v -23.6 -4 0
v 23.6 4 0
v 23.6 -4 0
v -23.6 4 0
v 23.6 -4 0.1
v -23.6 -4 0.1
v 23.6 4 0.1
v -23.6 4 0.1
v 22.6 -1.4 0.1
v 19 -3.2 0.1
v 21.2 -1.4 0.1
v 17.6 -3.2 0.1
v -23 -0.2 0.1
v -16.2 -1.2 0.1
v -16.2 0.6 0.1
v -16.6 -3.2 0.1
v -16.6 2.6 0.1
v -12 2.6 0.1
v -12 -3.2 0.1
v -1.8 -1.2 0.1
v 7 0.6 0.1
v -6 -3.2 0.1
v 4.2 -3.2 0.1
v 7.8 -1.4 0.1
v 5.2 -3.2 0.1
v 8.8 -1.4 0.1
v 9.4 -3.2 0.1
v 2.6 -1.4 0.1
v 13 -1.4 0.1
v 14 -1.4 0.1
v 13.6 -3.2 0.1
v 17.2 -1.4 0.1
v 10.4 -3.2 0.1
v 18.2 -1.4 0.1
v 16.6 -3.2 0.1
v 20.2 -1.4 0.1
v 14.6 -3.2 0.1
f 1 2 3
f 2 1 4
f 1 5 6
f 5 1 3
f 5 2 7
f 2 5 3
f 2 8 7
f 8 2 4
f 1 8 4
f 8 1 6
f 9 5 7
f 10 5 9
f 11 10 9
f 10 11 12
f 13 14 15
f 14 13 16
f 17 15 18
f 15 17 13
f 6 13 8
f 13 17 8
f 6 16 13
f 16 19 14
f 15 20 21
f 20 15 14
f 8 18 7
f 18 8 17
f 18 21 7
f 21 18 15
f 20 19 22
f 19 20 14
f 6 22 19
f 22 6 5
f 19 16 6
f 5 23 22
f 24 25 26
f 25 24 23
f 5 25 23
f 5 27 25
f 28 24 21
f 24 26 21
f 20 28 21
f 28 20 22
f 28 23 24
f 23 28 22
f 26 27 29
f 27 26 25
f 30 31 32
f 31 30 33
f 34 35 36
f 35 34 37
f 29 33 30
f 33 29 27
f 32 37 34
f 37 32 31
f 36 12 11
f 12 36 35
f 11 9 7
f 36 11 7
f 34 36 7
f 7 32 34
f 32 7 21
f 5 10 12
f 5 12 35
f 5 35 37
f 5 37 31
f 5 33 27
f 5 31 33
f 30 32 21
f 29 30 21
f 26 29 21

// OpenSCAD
// file: ../p/4-4edge.scad
use <../lib.scad>
$fa=1; $fs=0.2;
function ldraw_lib__4_4edge(realsolid=false) = [
// 0 Circle 1.0
// 0 Name: 4-4edge.dat
// 0 Author: James Jessiman
// 0 !LDRAW_ORG Primitive UPDATE 2017-01
// 0 !LICENSE Licensed under CC BY 2.0 and CC BY 4.0 : see CAreadme.txt
// 
// 0 BFC CERTIFY CCW
  [0,"BFC","CERTIFY"],
  [0,"BFC","CCW"],
// 
// 0 !HISTORY 1998-12-15 [PTadmin] Official Update 1998-10
// 0 !HISTORY 2005-12-28 [PTadmin] Official Update 2005-01
// 0 !HISTORY 2007-06-24 [PTadmin] Header formatted for Contributor Agreement
// 0 !HISTORY 2008-07-01 [PTadmin] Official Update 2008-01
// 0 !HISTORY 2017-01-15 [Steffen] BFCed
// 0 !HISTORY 2017-12-30 [PTadmin] Official Update 2017-01
// 
// 
// 2 24 1 0 0 0.9239 0 0.3827
  [2,24,1,0,0,0.9239,0,0.3827],
// 2 24 0.9239 0 0.3827 0.7071 0 0.7071
  [2,24,0.9239,0,0.3827,0.7071,0,0.7071],
// 2 24 0.7071 0 0.7071 0.3827 0 0.9239
  [2,24,0.7071,0,0.7071,0.3827,0,0.9239],
// 2 24 0.3827 0 0.9239 0 0 1
  [2,24,0.3827,0,0.9239,0,0,1],
// 2 24 0 0 1 -0.3827 0 0.9239
  [2,24,0,0,1,-0.3827,0,0.9239],
// 2 24 -0.3827 0 0.9239 -0.7071 0 0.7071
  [2,24,-0.3827,0,0.9239,-0.7071,0,0.7071],
// 2 24 -0.7071 0 0.7071 -0.9239 0 0.3827
  [2,24,-0.7071,0,0.7071,-0.9239,0,0.3827],
// 2 24 -0.9239 0 0.3827 -1 0 -0
  [2,24,-0.9239,0,0.3827,-1,0,-0],
// 2 24 -1 0 -0 -0.9239 0 -0.3827
  [2,24,-1,0,-0,-0.9239,0,-0.3827],
// 2 24 -0.9239 0 -0.3827 -0.7071 0 -0.7071
  [2,24,-0.9239,0,-0.3827,-0.7071,0,-0.7071],
// 2 24 -0.7071 0 -0.7071 -0.3827 0 -0.9239
  [2,24,-0.7071,0,-0.7071,-0.3827,0,-0.9239],
// 2 24 -0.3827 0 -0.9239 0 0 -1
  [2,24,-0.3827,0,-0.9239,0,0,-1],
// 2 24 0 0 -1 0.3827 0 -0.9239
  [2,24,0,0,-1,0.3827,0,-0.9239],
// 2 24 0.3827 0 -0.9239 0.7071 0 -0.7071
  [2,24,0.3827,0,-0.9239,0.7071,0,-0.7071],
// 2 24 0.7071 0 -0.7071 0.9239 0 -0.3827
  [2,24,0.7071,0,-0.7071,0.9239,0,-0.3827],
// 2 24 0.9239 0 -0.3827 1 0 0
  [2,24,0.9239,0,-0.3827,1,0,0],
];
module ldraw_lib__4_4edge(step=0, col=false, unit=2/5, alt=false, line=0.2, solid=!$preview)
    makepoly(ldraw_lib__4_4edge(solid), step=step, col=col, unit=unit, alt=alt, line=line, solid=solid);
ldraw_lib__4_4edge(line=0.2);
// file: ../p/4-4disc.scad
use <../lib.scad>
$fa=1; $fs=0.2;
function ldraw_lib__4_4disc(realsolid=false) = [
// 0 Disc 1.0
// 0 Name: 4-4disc.dat
// 0 Author: James Jessiman
// 0 !LDRAW_ORG Primitive UPDATE 2002-02
// 0 !LICENSE Licensed under CC BY 2.0 and CC BY 4.0 : see CAreadme.txt
// 
// 0 BFC CERTIFY CCW
  [0,"BFC","CERTIFY"],
  [0,"BFC","CCW"],
// 
// 0 !HISTORY 1998-12-15 [PTadmin] Official Update 1998-10
// 0 !HISTORY 2002-03-23 [sbliss] Added BFC statement
// 0 !HISTORY 2002-04-25 [PTadmin] Official Update 2002-02
// 0 !HISTORY 2007-06-24 [PTadmin] Header formatted for Contributor Agreement
// 0 !HISTORY 2008-07-01 [PTadmin] Official Update 2008-01
// 
// 
// 3 16 0 0 0 1 0 0 0.9239 0 0.3827
  [3,16,0,0,0,1,0,0,0.9239,0,0.3827],
// 3 16 0 0 0 0.9239 0 0.3827 0.7071 0 0.7071
  [3,16,0,0,0,0.9239,0,0.3827,0.7071,0,0.7071],
// 3 16 0 0 0 0.7071 0 0.7071 0.3827 0 0.9239
  [3,16,0,0,0,0.7071,0,0.7071,0.3827,0,0.9239],
// 3 16 0 0 0 0.3827 0 0.9239 0 0 1
  [3,16,0,0,0,0.3827,0,0.9239,0,0,1],
// 3 16 0 0 0 0 0 1 -0.3827 0 0.9239
  [3,16,0,0,0,0,0,1,-0.3827,0,0.9239],
// 3 16 0 0 0 -0.3827 0 0.9239 -0.7071 0 0.7071
  [3,16,0,0,0,-0.3827,0,0.9239,-0.7071,0,0.7071],
// 3 16 0 0 0 -0.7071 0 0.7071 -0.9239 0 0.3827
  [3,16,0,0,0,-0.7071,0,0.7071,-0.9239,0,0.3827],
// 3 16 0 0 0 -0.9239 0 0.3827 -1 0 -0
  [3,16,0,0,0,-0.9239,0,0.3827,-1,0,-0],
// 3 16 0 0 0 -1 0 -0 -0.9239 0 -0.3827
  [3,16,0,0,0,-1,0,-0,-0.9239,0,-0.3827],
// 3 16 0 0 0 -0.9239 0 -0.3827 -0.7071 0 -0.7071
  [3,16,0,0,0,-0.9239,0,-0.3827,-0.7071,0,-0.7071],
// 3 16 0 0 0 -0.7071 0 -0.7071 -0.3827 0 -0.9239
  [3,16,0,0,0,-0.7071,0,-0.7071,-0.3827,0,-0.9239],
// 3 16 0 0 0 -0.3827 0 -0.9239 0 0 -1
  [3,16,0,0,0,-0.3827,0,-0.9239,0,0,-1],
// 3 16 0 0 0 0 0 -1 0.3827 0 -0.9239
  [3,16,0,0,0,0,0,-1,0.3827,0,-0.9239],
// 3 16 0 0 0 0.3827 0 -0.9239 0.7071 0 -0.7071
  [3,16,0,0,0,0.3827,0,-0.9239,0.7071,0,-0.7071],
// 3 16 0 0 0 0.7071 0 -0.7071 0.9239 0 -0.3827
  [3,16,0,0,0,0.7071,0,-0.7071,0.9239,0,-0.3827],
// 3 16 0 0 0 0.9239 0 -0.3827 1 0 0
  [3,16,0,0,0,0.9239,0,-0.3827,1,0,0],
// 0
];
module ldraw_lib__4_4disc(step=0, col=false, unit=2/5, alt=false, line=0.2, solid=!$preview)
    makepoly(ldraw_lib__4_4disc(solid), step=step, col=col, unit=unit, alt=alt, line=line, solid=solid);
ldraw_lib__4_4disc(line=0.2);
// file: ../p/4-4cyli.scad
use <../lib.scad>
$fa=1; $fs=0.2;
function ldraw_lib__4_4cyli(realsolid=false) = [
// 0 Cylinder 1.0
// 0 Name: 4-4cyli.dat
// 0 Author: James Jessiman
// 0 !LDRAW_ORG Primitive UPDATE 2005-01
// 0 !LICENSE Licensed under CC BY 2.0 and CC BY 4.0 : see CAreadme.txt
// 
// 0 BFC CERTIFY CCW
  [0,"BFC","CERTIFY"],
  [0,"BFC","CCW"],
// 
// 0 !HISTORY 1998-12-15 [PTadmin] Official Update 1998-10
// 0 !HISTORY 2002-03-23 [sbliss] Added BFC statement; merged headers from files in distributions LDraw 0.27 and Complete.
// 0 !HISTORY 2002-04-25 [PTadmin] Official Update 2002-02
// 0 !HISTORY 2004-12-14 [guyvivan] BFC CCW
// 0 !HISTORY 2005-12-28 [PTadmin] Official Update 2005-01
// 0 !HISTORY 2007-06-24 [PTadmin] Header formatted for Contributor Agreement
// 0 !HISTORY 2008-07-01 [PTadmin] Official Update 2008-01
// 
// 
// 4 16 1 1 0 0.9239 1 0.3827 0.9239 0 0.3827 1 0 0
  [4,16,1,1,0,0.9239,1,0.3827,0.9239,0,0.3827,1,0,0],
// 5 24 1 0 0 1 1 0 0.9239 0 0.3827 0.9239 0 -0.3827
  [5,24,1,0,0,1,1,0,0.9239,0,0.3827,0.9239,0,-0.3827],
// 4 16 0.9239 1 0.3827 0.7071 1 0.7071 0.7071 0 0.7071 0.9239 0 0.3827
  [4,16,0.9239,1,0.3827,0.7071,1,0.7071,0.7071,0,0.7071,0.9239,0,0.3827],
// 5 24 0.9239 0 0.3827 0.9239 1 0.3827 0.7071 0 0.7071 1 0 0
  [5,24,0.9239,0,0.3827,0.9239,1,0.3827,0.7071,0,0.7071,1,0,0],
// 4 16 0.7071 1 0.7071 0.3827 1 0.9239 0.3827 0 0.9239 0.7071 0 0.7071
  [4,16,0.7071,1,0.7071,0.3827,1,0.9239,0.3827,0,0.9239,0.7071,0,0.7071],
// 5 24 0.7071 0 0.7071 0.7071 1 0.7071 0.3827 0 0.9239 0.9239 0 0.3827
  [5,24,0.7071,0,0.7071,0.7071,1,0.7071,0.3827,0,0.9239,0.9239,0,0.3827],
// 4 16 0.3827 1 0.9239 0 1 1 0 0 1 0.3827 0 0.9239
  [4,16,0.3827,1,0.9239,0,1,1,0,0,1,0.3827,0,0.9239],
// 5 24 0.3827 0 0.9239 0.3827 1 0.9239 0 0 1 0.7071 0 0.7071
  [5,24,0.3827,0,0.9239,0.3827,1,0.9239,0,0,1,0.7071,0,0.7071],
// 4 16 0 1 1 -0.3827 1 0.9239 -0.3827 0 0.9239 0 0 1
  [4,16,0,1,1,-0.3827,1,0.9239,-0.3827,0,0.9239,0,0,1],
// 5 24 0 0 1 0 1 1 -0.3827 0 0.9239 0.3827 0 0.9239
  [5,24,0,0,1,0,1,1,-0.3827,0,0.9239,0.3827,0,0.9239],
// 4 16 -0.3827 1 0.9239 -0.7071 1 0.7071 -0.7071 0 0.7071 -0.3827 0 0.9239
  [4,16,-0.3827,1,0.9239,-0.7071,1,0.7071,-0.7071,0,0.7071,-0.3827,0,0.9239],
// 5 24 -0.3827 0 0.9239 -0.3827 1 0.9239 -0.7071 0 0.7071 0 0 1
  [5,24,-0.3827,0,0.9239,-0.3827,1,0.9239,-0.7071,0,0.7071,0,0,1],
// 4 16 -0.7071 1 0.7071 -0.9239 1 0.3827 -0.9239 0 0.3827 -0.7071 0 0.7071
  [4,16,-0.7071,1,0.7071,-0.9239,1,0.3827,-0.9239,0,0.3827,-0.7071,0,0.7071],
// 5 24 -0.7071 0 0.7071 -0.7071 1 0.7071 -0.9239 0 0.3827 -0.3827 0 0.9239
  [5,24,-0.7071,0,0.7071,-0.7071,1,0.7071,-0.9239,0,0.3827,-0.3827,0,0.9239],
// 4 16 -0.9239 1 0.3827 -1 1 0 -1 0 0 -0.9239 0 0.3827
  [4,16,-0.9239,1,0.3827,-1,1,0,-1,0,0,-0.9239,0,0.3827],
// 5 24 -0.9239 0 0.3827 -0.9239 1 0.3827 -1 0 0 -0.7071 0 0.7071
  [5,24,-0.9239,0,0.3827,-0.9239,1,0.3827,-1,0,0,-0.7071,0,0.7071],
// 4 16 -1 1 0 -0.9239 1 -0.3827 -0.9239 0 -0.3827 -1 0 0
  [4,16,-1,1,0,-0.9239,1,-0.3827,-0.9239,0,-0.3827,-1,0,0],
// 5 24 -1 0 0 -1 1 0 -0.9239 0 -0.3827 -0.9239 0 0.3827
  [5,24,-1,0,0,-1,1,0,-0.9239,0,-0.3827,-0.9239,0,0.3827],
// 4 16 -0.9239 1 -0.3827 -0.7071 1 -0.7071 -0.7071 0 -0.7071 -0.9239 0 -0.3827
  [4,16,-0.9239,1,-0.3827,-0.7071,1,-0.7071,-0.7071,0,-0.7071,-0.9239,0,-0.3827],
// 5 24 -0.9239 0 -0.3827 -0.9239 1 -0.3827 -0.7071 0 -0.7071 -1 0 0
  [5,24,-0.9239,0,-0.3827,-0.9239,1,-0.3827,-0.7071,0,-0.7071,-1,0,0],
// 4 16 -0.7071 1 -0.7071 -0.3827 1 -0.9239 -0.3827 0 -0.9239 -0.7071 0 -0.7071
  [4,16,-0.7071,1,-0.7071,-0.3827,1,-0.9239,-0.3827,0,-0.9239,-0.7071,0,-0.7071],
// 5 24 -0.7071 0 -0.7071 -0.7071 1 -0.7071 -0.3827 0 -0.9239 -0.9239 0 -0.3827
  [5,24,-0.7071,0,-0.7071,-0.7071,1,-0.7071,-0.3827,0,-0.9239,-0.9239,0,-0.3827],
// 4 16 -0.3827 1 -0.9239 0 1 -1 0 0 -1 -0.3827 0 -0.9239
  [4,16,-0.3827,1,-0.9239,0,1,-1,0,0,-1,-0.3827,0,-0.9239],
// 5 24 -0.3827 0 -0.9239 -0.3827 1 -0.9239 0 0 -1 -0.7071 0 -0.7071
  [5,24,-0.3827,0,-0.9239,-0.3827,1,-0.9239,0,0,-1,-0.7071,0,-0.7071],
// 4 16 0 1 -1 0.3827 1 -0.9239 0.3827 0 -0.9239 0 0 -1
  [4,16,0,1,-1,0.3827,1,-0.9239,0.3827,0,-0.9239,0,0,-1],
// 5 24 0 0 -1 0 1 -1 0.3827 0 -0.9239 -0.3827 0 -0.9239
  [5,24,0,0,-1,0,1,-1,0.3827,0,-0.9239,-0.3827,0,-0.9239],
// 4 16 0.3827 1 -0.9239 0.7071 1 -0.7071 0.7071 0 -0.7071 0.3827 0 -0.9239
  [4,16,0.3827,1,-0.9239,0.7071,1,-0.7071,0.7071,0,-0.7071,0.3827,0,-0.9239],
// 5 24 0.3827 0 -0.9239 0.3827 1 -0.9239 0.7071 0 -0.7071 0 0 -1
  [5,24,0.3827,0,-0.9239,0.3827,1,-0.9239,0.7071,0,-0.7071,0,0,-1],
// 4 16 0.7071 1 -0.7071 0.9239 1 -0.3827 0.9239 0 -0.3827 0.7071 0 -0.7071
  [4,16,0.7071,1,-0.7071,0.9239,1,-0.3827,0.9239,0,-0.3827,0.7071,0,-0.7071],
// 5 24 0.7071 0 -0.7071 0.7071 1 -0.7071 0.9239 0 -0.3827 0.3827 0 -0.9239
  [5,24,0.7071,0,-0.7071,0.7071,1,-0.7071,0.9239,0,-0.3827,0.3827,0,-0.9239],
// 4 16 0.9239 1 -0.3827 1 1 0 1 0 0 0.9239 0 -0.3827
  [4,16,0.9239,1,-0.3827,1,1,0,1,0,0,0.9239,0,-0.3827],
// 5 24 0.9239 0 -0.3827 0.9239 1 -0.3827 1 0 0 0.7071 0 -0.7071
  [5,24,0.9239,0,-0.3827,0.9239,1,-0.3827,1,0,0,0.7071,0,-0.7071],
// 0
];
module ldraw_lib__4_4cyli(step=0, col=false, unit=2/5, alt=false, line=0.2, solid=!$preview)
    makepoly(ldraw_lib__4_4cyli(solid), step=step, col=col, unit=unit, alt=alt, line=line, solid=solid);
ldraw_lib__4_4cyli(line=0.2);
// file: ../p/stud3.scad
use <../lib.scad>
use <4-4cyli.scad>
use <4-4disc.scad>
use <4-4edge.scad>
$fa=1; $fs=0.2;
function ldraw_lib__stud3(realsolid=false) = realsolid ? 
    [openscad(translate([0,0,-eps()], o=cylinder(4+eps(), r=4)),2)] : [
// 0 Stud Tube Solid
// 0 Name: stud3.dat
// 0 Author: James Jessiman
// 0 !LDRAW_ORG Primitive UPDATE 2012-01
// 0 !LICENSE Licensed under CC BY 2.0 and CC BY 4.0 : see CAreadme.txt
// 
// 0 BFC CERTIFY CCW
  [0,"BFC","CERTIFY"],
  [0,"BFC","CCW"],
// 
// 0 !HISTORY 2002-04-04 [sbliss] Modified for BFC compliance
// 0 !HISTORY 2002-04-25 [PTadmin] Official Update 2002-02
// 0 !HISTORY 2007-06-24 [PTadmin] Header formatted for Contributor Agreement
// 0 !HISTORY 2008-07-01 [PTadmin] Official Update 2008-01
// 0 !HISTORY 2012-02-16 [Philo] Changed to CCW
// 0 !HISTORY 2012-03-30 [PTadmin] Official Update 2012-01
// 
// 
// 1 16 0 -4 0 4 0 0 0 1 0 0 0 4 4-4edge.dat
  [1,16,0,-4,0,4,0,0,0,1,0,0,0,4, ldraw_lib__4_4edge(realsolid)],
// 1 16 0 0 0 4 0 0 0 1 0 0 0 4 4-4edge.dat
  [1,16,0,0,0,4,0,0,0,1,0,0,0,4, ldraw_lib__4_4edge(realsolid)],
// 1 16 0 -4 0 4 0 0 0 1 0 0 0 4 4-4disc.dat
  [1,16,0,-4,0,4,0,0,0,1,0,0,0,4, ldraw_lib__4_4disc(realsolid)],
// 1 16 0 -4 0 4 0 0 0 4 0 0 0 4 4-4cyli.dat
  [1,16,0,-4,0,4,0,0,0,4,0,0,0,4, ldraw_lib__4_4cyli(realsolid)],
];
module ldraw_lib__stud3(step=0, col=false, unit=2/5, alt=false, line=0.2, solid=!$preview)
    makepoly(ldraw_lib__stud3(solid), step=step, col=col, unit=unit, alt=alt, line=line, solid=solid);
ldraw_lib__stud3(line=0.2);
// file: ../p/stud.scad
use <../lib.scad>
use <4-4cyli.scad>
use <4-4disc.scad>
use <4-4edge.scad>
$fa=1; $fs=0.2;
function ldraw_lib__stud(realsolid=false) = realsolid ? 
    [openscad(translate([0,0,-eps()], o=cylinder(4+eps(), r=6)),2)] : [
// 0 Stud
// 0 Name: stud.dat
// 0 Author: James Jessiman
// 0 !LDRAW_ORG Primitive UPDATE 2012-01
// 0 !LICENSE Licensed under CC BY 2.0 and CC BY 4.0 : see CAreadme.txt
// 
// 0 BFC CERTIFY CCW
  [0,"BFC","CERTIFY"],
  [0,"BFC","CCW"],
// 
// 0 !HISTORY 2002-04-04 [sbliss] Modified for BFC compliance
// 0 !HISTORY 2002-04-25 [PTadmin] Official Update 2002-02
// 0 !HISTORY 2007-06-24 [PTadmin] Header formatted for Contributor Agreement
// 0 !HISTORY 2008-07-01 [PTadmin] Official Update 2008-01
// 0 !HISTORY 2012-02-16 [Philo] Changed to CCW
// 0 !HISTORY 2012-03-30 [PTadmin] Official Update 2012-01
// 
// 
// 1 16 0 0 0 6 0 0 0 1 0 0 0 6 4-4edge.dat
  [1,16,0,0,0,6,0,0,0,1,0,0,0,6, ldraw_lib__4_4edge(realsolid)],
// 1 16 0 -4 0 6 0 0 0 1 0 0 0 6 4-4edge.dat
  [1,16,0,-4,0,6,0,0,0,1,0,0,0,6, ldraw_lib__4_4edge(realsolid)],
// 1 16 0 0 0 6 0 0 0 -4 0 0 0 6 4-4cyli.dat
  [1,16,0,0,0,6,0,0,0,-4,0,0,0,6, ldraw_lib__4_4cyli(realsolid)],
// 1 16 0 -4 0 6 0 0 0 1 0 0 0 6 4-4disc.dat
  [1,16,0,-4,0,6,0,0,0,1,0,0,0,6, ldraw_lib__4_4disc(realsolid)],
];
module ldraw_lib__stud(step=0, col=false, unit=2/5, alt=false, line=0.2, solid=!$preview)
    makepoly(ldraw_lib__stud(solid), step=step, col=col, unit=unit, alt=alt, line=line, solid=solid);
ldraw_lib__stud(line=0.2);
// file: ../p/box5.scad
use <../lib.scad>
$fa=1; $fs=0.2;
function ldraw_lib__box5(realsolid=false) = [
// 0 Box with 5 Faces and All Edges
// 0 Name: box5.dat
// 0 Author: James Jessiman
// 0 !LDRAW_ORG Primitive UPDATE 2012-01
// 0 !LICENSE Licensed under CC BY 2.0 and CC BY 4.0 : see CAreadme.txt
// 
// 0 BFC CERTIFY CCW
  [0,"BFC","CERTIFY"],
  [0,"BFC","CCW"],
// 
// 0 !HISTORY 2002-04-03 [sbliss] Modified for BFC compliance
// 0 !HISTORY 2002-04-25 [PTadmin] Official Update 2002-02
// 0 !HISTORY 2007-06-24 [PTadmin] Header formatted for Contributor Agreement
// 0 !HISTORY 2008-07-01 [PTadmin] Official Update 2008-01
// 0 !HISTORY 2012-02-16 [Philo] Changed to CCW
// 0 !HISTORY 2012-03-30 [PTadmin] Official Update 2012-01
// 
// 
// 2 24 1 1 1 -1 1 1
  [2,24,1,1,1,-1,1,1],
// 2 24 -1 1 1 -1 1 -1
  [2,24,-1,1,1,-1,1,-1],
// 2 24 -1 1 -1 1 1 -1
  [2,24,-1,1,-1,1,1,-1],
// 2 24 1 1 -1 1 1 1
  [2,24,1,1,-1,1,1,1],
// 2 24 1 0 1 -1 0 1
  [2,24,1,0,1,-1,0,1],
// 2 24 -1 0 1 -1 0 -1
  [2,24,-1,0,1,-1,0,-1],
// 2 24 -1 0 -1 1 0 -1
  [2,24,-1,0,-1,1,0,-1],
// 2 24 1 0 -1 1 0 1
  [2,24,1,0,-1,1,0,1],
// 2 24 1 0 1 1 1 1
  [2,24,1,0,1,1,1,1],
// 2 24 -1 0 1 -1 1 1
  [2,24,-1,0,1,-1,1,1],
// 2 24 1 0 -1 1 1 -1
  [2,24,1,0,-1,1,1,-1],
// 2 24 -1 0 -1 -1 1 -1
  [2,24,-1,0,-1,-1,1,-1],
// 4 16 -1 1 1 1 1 1 1 1 -1 -1 1 -1
  [4,16,-1,1,1,1,1,1,1,1,-1,-1,1,-1],
// 4 16 -1 1 1 -1 0 1 1 0 1 1 1 1
  [4,16,-1,1,1,-1,0,1,1,0,1,1,1,1],
// 4 16 -1 1 -1 -1 0 -1 -1 0 1 -1 1 1
  [4,16,-1,1,-1,-1,0,-1,-1,0,1,-1,1,1],
// 4 16 1 1 -1 1 0 -1 -1 0 -1 -1 1 -1
  [4,16,1,1,-1,1,0,-1,-1,0,-1,-1,1,-1],
// 4 16 1 1 1 1 0 1 1 0 -1 1 1 -1
  [4,16,1,1,1,1,0,1,1,0,-1,1,1,-1],
];
module ldraw_lib__box5(step=0, col=false, unit=2/5, alt=false, line=0.2, solid=!$preview)
    makepoly(ldraw_lib__box5(solid), step=step, col=col, unit=unit, alt=alt, line=line, solid=solid);
ldraw_lib__box5(line=0.2);
// file: ../p/box4t.scad
use <../lib.scad>
$fa=1; $fs=0.2;
function ldraw_lib__box4t(realsolid=false) = [
// 0 Box with 4 Adjacent Faces and All Edges
// 0 Name: box4t.dat
// 0 Author: Tore Eriksson [Tore_Eriksson]
// 0 !LDRAW_ORG Primitive UPDATE 2003-02
// 0 !LICENSE Licensed under CC BY 2.0 and CC BY 4.0 : see CAreadme.txt
// 
// 0 BFC CERTIFY CCW
  [0,"BFC","CERTIFY"],
  [0,"BFC","CCW"],
// 
// 0 !HISTORY 1997-09-29 [PTadmin] Official Update 1997-15
// 0 !HISTORY 2002-08-31 [izanette] Modified with WINDZ for BFC compliance
// 0 !HISTORY 2003-08-01 [PTadmin] Official Update 2003-02
// 0 !HISTORY 2007-06-24 [PTadmin] Header formatted for Contributor Agreement
// 0 !HISTORY 2008-07-01 [PTadmin] Official Update 2008-01
// 
// 
// 2 24 1 1 1 -1 1 1
  [2,24,1,1,1,-1,1,1],
// 2 24 -1 1 1 -1 1 -1
  [2,24,-1,1,1,-1,1,-1],
// 2 24 -1 1 -1 1 1 -1
  [2,24,-1,1,-1,1,1,-1],
// 2 24 1 1 -1 1 1 1
  [2,24,1,1,-1,1,1,1],
// 2 24 1 0 1 -1 0 1
  [2,24,1,0,1,-1,0,1],
// 2 24 -1 0 1 -1 0 -1
  [2,24,-1,0,1,-1,0,-1],
// 2 24 -1 0 -1 1 0 -1
  [2,24,-1,0,-1,1,0,-1],
// 2 24 1 0 -1 1 0 1
  [2,24,1,0,-1,1,0,1],
// 2 24 1 0 1 1 1 1
  [2,24,1,0,1,1,1,1],
// 2 24 -1 0 1 -1 1 1
  [2,24,-1,0,1,-1,1,1],
// 2 24 1 0 -1 1 1 -1
  [2,24,1,0,-1,1,1,-1],
// 2 24 -1 0 -1 -1 1 -1
  [2,24,-1,0,-1,-1,1,-1],
// 4 16 1 1 1 1 1 -1 -1 1 -1 -1 1 1
  [4,16,1,1,1,1,1,-1,-1,1,-1,-1,1,1],
// 4 16 1 1 1 -1 1 1 -1 0 1 1 0 1
  [4,16,1,1,1,-1,1,1,-1,0,1,1,0,1],
// 4 16 -1 1 1 -1 1 -1 -1 0 -1 -1 0 1
  [4,16,-1,1,1,-1,1,-1,-1,0,-1,-1,0,1],
// 0 4 16 -1 1 -1 -1 0 -1 1 0 -1 1 1 -1
// 4 16 1 1 -1 1 1 1 1 0 1 1 0 -1
  [4,16,1,1,-1,1,1,1,1,0,1,1,0,-1],
// 0
];
module ldraw_lib__box4t(step=0, col=false, unit=2/5, alt=false, line=0.2, solid=!$preview)
    makepoly(ldraw_lib__box4t(solid), step=step, col=col, unit=unit, alt=alt, line=line, solid=solid);
ldraw_lib__box4t(line=0.2);
// file: s/3004s01.scad
use <../../lib.scad>
use <../../p/box4t.scad>
use <../../p/box5.scad>
use <../../p/stud.scad>
use <../../p/stud3.scad>
$fa=1; $fs=0.2;
function ldraw_lib__s__3004s01(realsolid=false) = [
// 0 ~Brick  1 x  2 without Front Face
// 0 Name: s\3004s01.dat
// 0 Author: James Jessiman
// 0 !LDRAW_ORG Subpart UPDATE 2003-03
// 0 !LICENSE Licensed under CC BY 2.0 and CC BY 4.0 : see CAreadme.txt
// 
// 0 BFC CERTIFY CCW
  [0,"BFC","CERTIFY"],
  [0,"BFC","CCW"],
// 
// 0 !HISTORY 2003-09-07 [jriley] Subfiling, BFC
// 0 !HISTORY 2003-12-19 [PTadmin] Official Update 2003-03
// 0 !HISTORY 2007-08-29 [PTadmin] Header formatted for Contributor Agreement
// 0 !HISTORY 2008-07-01 [PTadmin] Official Update 2008-01
// 
// 
// 1 16 0 4 0 1 0 0 0 -5 0 0 0 1 stud3.dat
  [1,16,0,4,0,1,0,0,0,-5,0,0,0,1, ldraw_lib__stud3(realsolid)],
// 0 BFC INVERTNEXT
  [0,"BFC","INVERTNEXT"],
// 1 16 0 24 0 16 0 0 0 -20 0 0 0 6 box5.dat
  [1,16,0,24,0,16,0,0,0,-20,0,0,0,6, ldraw_lib__box5(realsolid)],
// 4 16 20 24 10 16 24 6 -16 24 6 -20 24 10
  [4,16,20,24,10,16,24,6,-16,24,6,-20,24,10],
// 4 16 -20 24 10 -16 24 6 -16 24 -6 -20 24 -10
  [4,16,-20,24,10,-16,24,6,-16,24,-6,-20,24,-10],
// 4 16 -20 24 -10 -16 24 -6 16 24 -6 20 24 -10
  [4,16,-20,24,-10,-16,24,-6,16,24,-6,20,24,-10],
// 4 16 20 24 -10 16 24 -6 16 24 6 20 24 10
  [4,16,20,24,-10,16,24,-6,16,24,6,20,24,10],
// 1 16 0 24 0 20 0 0 0 -24 0 0 0 10 box4t.dat
  [1,16,0,24,0,20,0,0,0,-24,0,0,0,10, ldraw_lib__box4t(realsolid)],
// 1 16 10 0 0 1 0 0 0 1 0 0 0 1 stud.dat
  [1,16,10,0,0,1,0,0,0,1,0,0,0,1, ldraw_lib__stud(realsolid)],
// 1 16 -10 0 0 1 0 0 0 1 0 0 0 1 stud.dat
  [1,16,-10,0,0,1,0,0,0,1,0,0,0,1, ldraw_lib__stud(realsolid)],
// 0
];
module ldraw_lib__s__3004s01(step=0, col=false, unit=2/5, alt=false, line=0.2, solid=!$preview)
    makepoly(ldraw_lib__s__3004s01(solid), step=step, col=col, unit=unit, alt=alt, line=line, solid=solid);
ldraw_lib__s__3004s01(line=0.2);
// file: ../p/box5-12.scad
use <../lib.scad>
$fa=1; $fs=0.2;
function ldraw_lib__box5_12(realsolid=false) = [
// 0 Box with 5 Faces without Any Edges
// 0 Name: box5-12.dat
// 0 Author: Chris Dee [cwdee]
// 0 !LDRAW_ORG Primitive UPDATE 2009-02
// 0 !LICENSE Licensed under CC BY 2.0 and CC BY 4.0 : see CAreadme.txt
// 
// 0 BFC CERTIFY CCW
  [0,"BFC","CERTIFY"],
  [0,"BFC","CCW"],
// 
// 0 !HISTORY 2009-09-03 [PTadmin] Official Update 2009-02
// 
// 
// 4 16 1 1 1 1 1 -1 -1 1 -1 -1 1 1
  [4,16,1,1,1,1,1,-1,-1,1,-1,-1,1,1],
// 4 16 -1 0 1 1 0 1 1 1 1 -1 1 1
  [4,16,-1,0,1,1,0,1,1,1,1,-1,1,1],
// 4 16 -1 0 -1 -1 0 1 -1 1 1 -1 1 -1
  [4,16,-1,0,-1,-1,0,1,-1,1,1,-1,1,-1],
// 4 16 1 0 -1 -1 0 -1 -1 1 -1 1 1 -1
  [4,16,1,0,-1,-1,0,-1,-1,1,-1,1,1,-1],
// 4 16 1 0 1 1 0 -1 1 1 -1 1 1 1
  [4,16,1,0,1,1,0,-1,1,1,-1,1,1,1],
// 0
];
module ldraw_lib__box5_12(step=0, col=false, unit=2/5, alt=false, line=0.2, solid=!$preview)
    makepoly(ldraw_lib__box5_12(solid), step=step, col=col, unit=unit, alt=alt, line=line, solid=solid);
ldraw_lib__box5_12(line=0.2);
// file: 3004.scad
use <../lib.scad>
use <s/3004s01.scad>
$fa=1; $fs=0.2;
function ldraw_lib__3004(realsolid=false) = [
// 0 Brick  1 x  2
// 0 Name: 3004.dat
// 0 Author: James Jessiman
// 0 !LDRAW_ORG Part UPDATE 2022-05
// 0 !LICENSE Licensed under CC BY 2.0 and CC BY 4.0 : see CAreadme.txt
// 
// 0 BFC CERTIFY CCW
  [0,"BFC","CERTIFY"],
  [0,"BFC","CCW"],
// 
// 0 !HISTORY 2001-10-26 [PTadmin] Official Update 2001-01
// 0 !HISTORY 2002-05-07 {unknown} BFC Certification
// 0 !HISTORY 2002-06-11 [PTadmin] Official Update 2002-03
// 0 !HISTORY 2007-05-07 [PTadmin] Header formatted for Contributor Agreement
// 0 !HISTORY 2008-07-01 [PTadmin] Official Update 2008-01
// 0 !HISTORY 2022-08-04 [MagFors] Using subfile
// 0 !HISTORY 2022-09-15 [PTadmin] Official Update 2022-05
// 
// 
// 1 16 0 0 0 1 0 0 0 1 0 0 0 1 s\3004s01.dat
  [1,16,0,0,0,1,0,0,0,1,0,0,0,1, ldraw_lib__s__3004s01(realsolid)],
// 4 16 -20 24 -10 20 24 -10 20 0 -10 -20 0 -10
  [4,16,-20,24,-10,20,24,-10,20,0,-10,-20,0,-10],
];
module ldraw_lib__3004(step=0, col=false, unit=2/5, alt=false, line=0.2, solid=!$preview)
    makepoly(ldraw_lib__3004(solid), step=step, col=col, unit=unit, alt=alt, line=line, solid=solid);
ldraw_lib__3004(line=0.2);
// file: 4116878a.scad
use <../lib.scad>
use <../p/box5-12.scad>
$fa=1; $fs=0.2;
function ldraw_lib__4116878a(realsolid=false) = [
// 0 Sticker  1 x  5.9 with White Arrow Right on Black Background
// 0 Name: 4116878a.dat
// 0 Author: Gerald Lasser [GeraldLasser]
// 0 !LDRAW_ORG Part UPDATE 2014-02
// 0 !LICENSE Licensed under CC BY 2.0 and CC BY 4.0 : see CAreadme.txt
// 
// 0 BFC CERTIFY CCW
  [0,"BFC","CERTIFY"],
  [0,"BFC","CCW"],
// 
// 0 !KEYWORDS Set 4533
// 
// 0 !HISTORY 2014-12-23 [PTadmin] Official Update 2014-02
// 
// 
// 1 16 0 -0.25 0 59 0 0 0 0.25 0 0 0 -10 box5-12.dat
  [1,16,0,-0.25,0,59,0,0,0,0.25,0,0,0,-10, ldraw_lib__box5_12(realsolid)],
// 3 0 -59 -0.25 10 -59 -0.25 -10 -56.5 -0.25 -3.5
  [3,0,-59,-0.25,10,-59,-0.25,-10,-56.5,-0.25,-3.5],
// 3 0 -56.5 -0.25 -3.5 -59 -0.25 -10 -47.5 -0.25 -8
  [3,0,-56.5,-0.25,-3.5,-59,-0.25,-10,-47.5,-0.25,-8],
// 4 15 -56.5 -0.25 -3.5 -47.5 -0.25 -8 -44 -0.25 -8 -53 -0.25 -3.5
  [4,15,-56.5,-0.25,-3.5,-47.5,-0.25,-8,-44,-0.25,-8,-53,-0.25,-3.5],
// 4 15 40.5 -0.25 -3 41.5 -0.25 -8 57.5 -0.25 -0.5 40.5 -0.25 1.5
  [4,15,40.5,-0.25,-3,41.5,-0.25,-8,57.5,-0.25,-0.5,40.5,-0.25,1.5],
// 4 15 40.5 -0.25 1.5 57.5 -0.25 -0.5 41.5 -0.25 6.5 30 -0.25 6.5
  [4,15,40.5,-0.25,1.5,57.5,-0.25,-0.5,41.5,-0.25,6.5,30,-0.25,6.5],
// 3 0 59 -0.25 10 57.5 -0.25 -0.5 59 -0.25 -10
  [3,0,59,-0.25,10,57.5,-0.25,-0.5,59,-0.25,-10],
// 3 0 59 -0.25 10 41.5 -0.25 6.5 57.5 -0.25 -0.5
  [3,0,59,-0.25,10,41.5,-0.25,6.5,57.5,-0.25,-0.5],
// 3 0 57.5 -0.25 -0.5 41.5 -0.25 -8 59 -0.25 -10
  [3,0,57.5,-0.25,-0.5,41.5,-0.25,-8,59,-0.25,-10],
// 3 15 40.5 -0.25 -3 30 -0.25 -8 41.5 -0.25 -8
  [3,15,40.5,-0.25,-3,30,-0.25,-8,41.5,-0.25,-8],
// 4 15 4.5 -0.25 -3 40.5 -0.25 -3 40.5 -0.25 1.5 -17.5 -0.25 1.5
  [4,15,4.5,-0.25,-3,40.5,-0.25,-3,40.5,-0.25,1.5,-17.5,-0.25,1.5],
// 4 0 30 -0.25 6.5 41.5 -0.25 6.5 59 -0.25 10 -59 -0.25 10
  [4,0,30,-0.25,6.5,41.5,-0.25,6.5,59,-0.25,10,-59,-0.25,10],
// 4 0 30 -0.25 6.5 -59 -0.25 10 -17.5 -0.25 1.5 40.5 -0.25 1.5
  [4,0,30,-0.25,6.5,-59,-0.25,10,-17.5,-0.25,1.5,40.5,-0.25,1.5],
// 4 0 30 -0.25 -8 40.5 -0.25 -3 4.5 -0.25 -3 15 -0.25 -8
  [4,0,30,-0.25,-8,40.5,-0.25,-3,4.5,-0.25,-3,15,-0.25,-8],
// 4 0 59 -0.25 -10 30 -0.25 -8 15 -0.25 -8 -59 -0.25 -10
  [4,0,59,-0.25,-10,30,-0.25,-8,15,-0.25,-8,-59,-0.25,-10],
// 3 0 59 -0.25 -10 41.5 -0.25 -8 30 -0.25 -8
  [3,0,59,-0.25,-10,41.5,-0.25,-8,30,-0.25,-8],
// 3 0 15 -0.25 -8 -10.5 -0.25 -8 -59 -0.25 -10
  [3,0,15,-0.25,-8,-10.5,-0.25,-8,-59,-0.25,-10],
// 4 0 -13 -0.25 -8 -10.5 -0.25 -8 -19.5 -0.25 -3.5 -22 -0.25 -3.5
  [4,0,-13,-0.25,-8,-10.5,-0.25,-8,-19.5,-0.25,-3.5,-22,-0.25,-3.5],
// 3 0 -10.5 -0.25 -8 -13 -0.25 -8 -59 -0.25 -10
  [3,0,-10.5,-0.25,-8,-13,-0.25,-8,-59,-0.25,-10],
// 3 0 -13 -0.25 -8 -23.5 -0.25 -8 -59 -0.25 -10
  [3,0,-13,-0.25,-8,-23.5,-0.25,-8,-59,-0.25,-10],
// 3 0 -17.5 -0.25 1.5 -19.5 -0.25 -3.5 -6.5 -0.25 -3.5
  [3,0,-17.5,-0.25,1.5,-19.5,-0.25,-3.5,-6.5,-0.25,-3.5],
// 3 0 -17.5 -0.25 1.5 -22 -0.25 -3.5 -19.5 -0.25 -3.5
  [3,0,-17.5,-0.25,1.5,-22,-0.25,-3.5,-19.5,-0.25,-3.5],
// 4 15 4.5 -0.25 -3 -17.5 -0.25 1.5 -6.5 -0.25 -3.5 15 -0.25 -8
  [4,15,4.5,-0.25,-3,-17.5,-0.25,1.5,-6.5,-0.25,-3.5,15,-0.25,-8],
// 4 15 -6.5 -0.25 -3.5 -19.5 -0.25 -3.5 -10.5 -0.25 -8 15 -0.25 -8
  [4,15,-6.5,-0.25,-3.5,-19.5,-0.25,-3.5,-10.5,-0.25,-8,15,-0.25,-8],
// 4 15 -23.5 -0.25 -8 -13 -0.25 -8 -22 -0.25 -3.5 -32.5 -0.25 -3.5
  [4,15,-23.5,-0.25,-8,-13,-0.25,-8,-22,-0.25,-3.5,-32.5,-0.25,-3.5],
// 4 15 -34 -0.25 -8 -26 -0.25 -8 -35 -0.25 -3.5 -43 -0.25 -3.5
  [4,15,-34,-0.25,-8,-26,-0.25,-8,-35,-0.25,-3.5,-43,-0.25,-3.5],
// 4 15 -41.5 -0.25 -8 -36.5 -0.25 -8 -45.5 -0.25 -3.5 -50.5 -0.25 -3.5
  [4,15,-41.5,-0.25,-8,-36.5,-0.25,-8,-45.5,-0.25,-3.5,-50.5,-0.25,-3.5],
// 4 0 -35 -0.25 -3.5 -26 -0.25 -8 -23.5 -0.25 -8 -32.5 -0.25 -3.5
  [4,0,-35,-0.25,-3.5,-26,-0.25,-8,-23.5,-0.25,-8,-32.5,-0.25,-3.5],
// 4 0 -45.5 -0.25 -3.5 -36.5 -0.25 -8 -34 -0.25 -8 -43 -0.25 -3.5
  [4,0,-45.5,-0.25,-3.5,-36.5,-0.25,-8,-34,-0.25,-8,-43,-0.25,-3.5],
// 4 0 -53 -0.25 -3.5 -44 -0.25 -8 -41.5 -0.25 -8 -50.5 -0.25 -3.5
  [4,0,-53,-0.25,-3.5,-44,-0.25,-8,-41.5,-0.25,-8,-50.5,-0.25,-3.5],
// 3 0 -59 -0.25 10 -56.5 -0.25 -3.5 -53 -0.25 -3.5
  [3,0,-59,-0.25,10,-56.5,-0.25,-3.5,-53,-0.25,-3.5],
// 3 0 -59 -0.25 10 -53 -0.25 -3.5 -50.5 -0.25 -3.5
  [3,0,-59,-0.25,10,-53,-0.25,-3.5,-50.5,-0.25,-3.5],
// 3 0 -59 -0.25 10 -50.5 -0.25 -3.5 -45.5 -0.25 -3.5
  [3,0,-59,-0.25,10,-50.5,-0.25,-3.5,-45.5,-0.25,-3.5],
// 4 0 -59 -0.25 10 -45.5 -0.25 -3.5 -43 -0.25 -3.5 -17.5 -0.25 1.5
  [4,0,-59,-0.25,10,-45.5,-0.25,-3.5,-43,-0.25,-3.5,-17.5,-0.25,1.5],
// 3 0 -44 -0.25 -8 -47.5 -0.25 -8 -59 -0.25 -10
  [3,0,-44,-0.25,-8,-47.5,-0.25,-8,-59,-0.25,-10],
// 3 0 -41.5 -0.25 -8 -44 -0.25 -8 -59 -0.25 -10
  [3,0,-41.5,-0.25,-8,-44,-0.25,-8,-59,-0.25,-10],
// 3 0 -36.5 -0.25 -8 -41.5 -0.25 -8 -59 -0.25 -10
  [3,0,-36.5,-0.25,-8,-41.5,-0.25,-8,-59,-0.25,-10],
// 3 0 -34 -0.25 -8 -36.5 -0.25 -8 -59 -0.25 -10
  [3,0,-34,-0.25,-8,-36.5,-0.25,-8,-59,-0.25,-10],
// 3 0 -23.5 -0.25 -8 -26 -0.25 -8 -59 -0.25 -10
  [3,0,-23.5,-0.25,-8,-26,-0.25,-8,-59,-0.25,-10],
// 3 0 -26 -0.25 -8 -34 -0.25 -8 -59 -0.25 -10
  [3,0,-26,-0.25,-8,-34,-0.25,-8,-59,-0.25,-10],
// 3 0 -17.5 -0.25 1.5 -43 -0.25 -3.5 -35 -0.25 -3.5
  [3,0,-17.5,-0.25,1.5,-43,-0.25,-3.5,-35,-0.25,-3.5],
// 3 0 -17.5 -0.25 1.5 -35 -0.25 -3.5 -32.5 -0.25 -3.5
  [3,0,-17.5,-0.25,1.5,-35,-0.25,-3.5,-32.5,-0.25,-3.5],
// 3 0 -17.5 -0.25 1.5 -32.5 -0.25 -3.5 -22 -0.25 -3.5
  [3,0,-17.5,-0.25,1.5,-32.5,-0.25,-3.5,-22,-0.25,-3.5],
];
module ldraw_lib__4116878a(step=0, col=false, unit=2/5, alt=false, line=0.2, solid=!$preview)
    makepoly(ldraw_lib__4116878a(solid), step=step, col=col, unit=unit, alt=alt, line=line, solid=solid);
ldraw_lib__4116878a(line=0.2);
// main file
use <../lib.scad>
use <4116878a.scad>
$fa=1; $fs=0.2;
function ldraw_lib__4116878b(realsolid=false) = [
// 0 Sticker  1 x  5.9 with White Arrow Left on Black Background
// 0 Name: 4116878b.dat
// 0 Author: Gerald Lasser [GeraldLasser]
// 0 !LDRAW_ORG Part UPDATE 2014-02
// 0 !LICENSE Licensed under CC BY 2.0 and CC BY 4.0 : see CAreadme.txt
// 
// 0 BFC CERTIFY CCW
  [0,"BFC","CERTIFY"],
  [0,"BFC","CCW"],
// 
// 0 !KEYWORDS Set 4533
// 
// 0 !HISTORY 2014-12-23 [PTadmin] Official Update 2014-02
// 
// 
// 1 16 0 0 0 -1 0 0 0 1 0 0 0 1 4116878a.dat
  [1,16,0,0,0,-1,0,0,0,1,0,0,0,1, ldraw_lib__4116878a(realsolid)],
];
module ldraw_lib__4116878b(step=0, col=false, unit=2/5, alt=false, line=0.2, solid=!$preview)
    makepoly(ldraw_lib__4116878b(solid), step=step, col=col, unit=unit, alt=alt, line=line, solid=solid);
ldraw_lib__4116878b(line=0.2);
